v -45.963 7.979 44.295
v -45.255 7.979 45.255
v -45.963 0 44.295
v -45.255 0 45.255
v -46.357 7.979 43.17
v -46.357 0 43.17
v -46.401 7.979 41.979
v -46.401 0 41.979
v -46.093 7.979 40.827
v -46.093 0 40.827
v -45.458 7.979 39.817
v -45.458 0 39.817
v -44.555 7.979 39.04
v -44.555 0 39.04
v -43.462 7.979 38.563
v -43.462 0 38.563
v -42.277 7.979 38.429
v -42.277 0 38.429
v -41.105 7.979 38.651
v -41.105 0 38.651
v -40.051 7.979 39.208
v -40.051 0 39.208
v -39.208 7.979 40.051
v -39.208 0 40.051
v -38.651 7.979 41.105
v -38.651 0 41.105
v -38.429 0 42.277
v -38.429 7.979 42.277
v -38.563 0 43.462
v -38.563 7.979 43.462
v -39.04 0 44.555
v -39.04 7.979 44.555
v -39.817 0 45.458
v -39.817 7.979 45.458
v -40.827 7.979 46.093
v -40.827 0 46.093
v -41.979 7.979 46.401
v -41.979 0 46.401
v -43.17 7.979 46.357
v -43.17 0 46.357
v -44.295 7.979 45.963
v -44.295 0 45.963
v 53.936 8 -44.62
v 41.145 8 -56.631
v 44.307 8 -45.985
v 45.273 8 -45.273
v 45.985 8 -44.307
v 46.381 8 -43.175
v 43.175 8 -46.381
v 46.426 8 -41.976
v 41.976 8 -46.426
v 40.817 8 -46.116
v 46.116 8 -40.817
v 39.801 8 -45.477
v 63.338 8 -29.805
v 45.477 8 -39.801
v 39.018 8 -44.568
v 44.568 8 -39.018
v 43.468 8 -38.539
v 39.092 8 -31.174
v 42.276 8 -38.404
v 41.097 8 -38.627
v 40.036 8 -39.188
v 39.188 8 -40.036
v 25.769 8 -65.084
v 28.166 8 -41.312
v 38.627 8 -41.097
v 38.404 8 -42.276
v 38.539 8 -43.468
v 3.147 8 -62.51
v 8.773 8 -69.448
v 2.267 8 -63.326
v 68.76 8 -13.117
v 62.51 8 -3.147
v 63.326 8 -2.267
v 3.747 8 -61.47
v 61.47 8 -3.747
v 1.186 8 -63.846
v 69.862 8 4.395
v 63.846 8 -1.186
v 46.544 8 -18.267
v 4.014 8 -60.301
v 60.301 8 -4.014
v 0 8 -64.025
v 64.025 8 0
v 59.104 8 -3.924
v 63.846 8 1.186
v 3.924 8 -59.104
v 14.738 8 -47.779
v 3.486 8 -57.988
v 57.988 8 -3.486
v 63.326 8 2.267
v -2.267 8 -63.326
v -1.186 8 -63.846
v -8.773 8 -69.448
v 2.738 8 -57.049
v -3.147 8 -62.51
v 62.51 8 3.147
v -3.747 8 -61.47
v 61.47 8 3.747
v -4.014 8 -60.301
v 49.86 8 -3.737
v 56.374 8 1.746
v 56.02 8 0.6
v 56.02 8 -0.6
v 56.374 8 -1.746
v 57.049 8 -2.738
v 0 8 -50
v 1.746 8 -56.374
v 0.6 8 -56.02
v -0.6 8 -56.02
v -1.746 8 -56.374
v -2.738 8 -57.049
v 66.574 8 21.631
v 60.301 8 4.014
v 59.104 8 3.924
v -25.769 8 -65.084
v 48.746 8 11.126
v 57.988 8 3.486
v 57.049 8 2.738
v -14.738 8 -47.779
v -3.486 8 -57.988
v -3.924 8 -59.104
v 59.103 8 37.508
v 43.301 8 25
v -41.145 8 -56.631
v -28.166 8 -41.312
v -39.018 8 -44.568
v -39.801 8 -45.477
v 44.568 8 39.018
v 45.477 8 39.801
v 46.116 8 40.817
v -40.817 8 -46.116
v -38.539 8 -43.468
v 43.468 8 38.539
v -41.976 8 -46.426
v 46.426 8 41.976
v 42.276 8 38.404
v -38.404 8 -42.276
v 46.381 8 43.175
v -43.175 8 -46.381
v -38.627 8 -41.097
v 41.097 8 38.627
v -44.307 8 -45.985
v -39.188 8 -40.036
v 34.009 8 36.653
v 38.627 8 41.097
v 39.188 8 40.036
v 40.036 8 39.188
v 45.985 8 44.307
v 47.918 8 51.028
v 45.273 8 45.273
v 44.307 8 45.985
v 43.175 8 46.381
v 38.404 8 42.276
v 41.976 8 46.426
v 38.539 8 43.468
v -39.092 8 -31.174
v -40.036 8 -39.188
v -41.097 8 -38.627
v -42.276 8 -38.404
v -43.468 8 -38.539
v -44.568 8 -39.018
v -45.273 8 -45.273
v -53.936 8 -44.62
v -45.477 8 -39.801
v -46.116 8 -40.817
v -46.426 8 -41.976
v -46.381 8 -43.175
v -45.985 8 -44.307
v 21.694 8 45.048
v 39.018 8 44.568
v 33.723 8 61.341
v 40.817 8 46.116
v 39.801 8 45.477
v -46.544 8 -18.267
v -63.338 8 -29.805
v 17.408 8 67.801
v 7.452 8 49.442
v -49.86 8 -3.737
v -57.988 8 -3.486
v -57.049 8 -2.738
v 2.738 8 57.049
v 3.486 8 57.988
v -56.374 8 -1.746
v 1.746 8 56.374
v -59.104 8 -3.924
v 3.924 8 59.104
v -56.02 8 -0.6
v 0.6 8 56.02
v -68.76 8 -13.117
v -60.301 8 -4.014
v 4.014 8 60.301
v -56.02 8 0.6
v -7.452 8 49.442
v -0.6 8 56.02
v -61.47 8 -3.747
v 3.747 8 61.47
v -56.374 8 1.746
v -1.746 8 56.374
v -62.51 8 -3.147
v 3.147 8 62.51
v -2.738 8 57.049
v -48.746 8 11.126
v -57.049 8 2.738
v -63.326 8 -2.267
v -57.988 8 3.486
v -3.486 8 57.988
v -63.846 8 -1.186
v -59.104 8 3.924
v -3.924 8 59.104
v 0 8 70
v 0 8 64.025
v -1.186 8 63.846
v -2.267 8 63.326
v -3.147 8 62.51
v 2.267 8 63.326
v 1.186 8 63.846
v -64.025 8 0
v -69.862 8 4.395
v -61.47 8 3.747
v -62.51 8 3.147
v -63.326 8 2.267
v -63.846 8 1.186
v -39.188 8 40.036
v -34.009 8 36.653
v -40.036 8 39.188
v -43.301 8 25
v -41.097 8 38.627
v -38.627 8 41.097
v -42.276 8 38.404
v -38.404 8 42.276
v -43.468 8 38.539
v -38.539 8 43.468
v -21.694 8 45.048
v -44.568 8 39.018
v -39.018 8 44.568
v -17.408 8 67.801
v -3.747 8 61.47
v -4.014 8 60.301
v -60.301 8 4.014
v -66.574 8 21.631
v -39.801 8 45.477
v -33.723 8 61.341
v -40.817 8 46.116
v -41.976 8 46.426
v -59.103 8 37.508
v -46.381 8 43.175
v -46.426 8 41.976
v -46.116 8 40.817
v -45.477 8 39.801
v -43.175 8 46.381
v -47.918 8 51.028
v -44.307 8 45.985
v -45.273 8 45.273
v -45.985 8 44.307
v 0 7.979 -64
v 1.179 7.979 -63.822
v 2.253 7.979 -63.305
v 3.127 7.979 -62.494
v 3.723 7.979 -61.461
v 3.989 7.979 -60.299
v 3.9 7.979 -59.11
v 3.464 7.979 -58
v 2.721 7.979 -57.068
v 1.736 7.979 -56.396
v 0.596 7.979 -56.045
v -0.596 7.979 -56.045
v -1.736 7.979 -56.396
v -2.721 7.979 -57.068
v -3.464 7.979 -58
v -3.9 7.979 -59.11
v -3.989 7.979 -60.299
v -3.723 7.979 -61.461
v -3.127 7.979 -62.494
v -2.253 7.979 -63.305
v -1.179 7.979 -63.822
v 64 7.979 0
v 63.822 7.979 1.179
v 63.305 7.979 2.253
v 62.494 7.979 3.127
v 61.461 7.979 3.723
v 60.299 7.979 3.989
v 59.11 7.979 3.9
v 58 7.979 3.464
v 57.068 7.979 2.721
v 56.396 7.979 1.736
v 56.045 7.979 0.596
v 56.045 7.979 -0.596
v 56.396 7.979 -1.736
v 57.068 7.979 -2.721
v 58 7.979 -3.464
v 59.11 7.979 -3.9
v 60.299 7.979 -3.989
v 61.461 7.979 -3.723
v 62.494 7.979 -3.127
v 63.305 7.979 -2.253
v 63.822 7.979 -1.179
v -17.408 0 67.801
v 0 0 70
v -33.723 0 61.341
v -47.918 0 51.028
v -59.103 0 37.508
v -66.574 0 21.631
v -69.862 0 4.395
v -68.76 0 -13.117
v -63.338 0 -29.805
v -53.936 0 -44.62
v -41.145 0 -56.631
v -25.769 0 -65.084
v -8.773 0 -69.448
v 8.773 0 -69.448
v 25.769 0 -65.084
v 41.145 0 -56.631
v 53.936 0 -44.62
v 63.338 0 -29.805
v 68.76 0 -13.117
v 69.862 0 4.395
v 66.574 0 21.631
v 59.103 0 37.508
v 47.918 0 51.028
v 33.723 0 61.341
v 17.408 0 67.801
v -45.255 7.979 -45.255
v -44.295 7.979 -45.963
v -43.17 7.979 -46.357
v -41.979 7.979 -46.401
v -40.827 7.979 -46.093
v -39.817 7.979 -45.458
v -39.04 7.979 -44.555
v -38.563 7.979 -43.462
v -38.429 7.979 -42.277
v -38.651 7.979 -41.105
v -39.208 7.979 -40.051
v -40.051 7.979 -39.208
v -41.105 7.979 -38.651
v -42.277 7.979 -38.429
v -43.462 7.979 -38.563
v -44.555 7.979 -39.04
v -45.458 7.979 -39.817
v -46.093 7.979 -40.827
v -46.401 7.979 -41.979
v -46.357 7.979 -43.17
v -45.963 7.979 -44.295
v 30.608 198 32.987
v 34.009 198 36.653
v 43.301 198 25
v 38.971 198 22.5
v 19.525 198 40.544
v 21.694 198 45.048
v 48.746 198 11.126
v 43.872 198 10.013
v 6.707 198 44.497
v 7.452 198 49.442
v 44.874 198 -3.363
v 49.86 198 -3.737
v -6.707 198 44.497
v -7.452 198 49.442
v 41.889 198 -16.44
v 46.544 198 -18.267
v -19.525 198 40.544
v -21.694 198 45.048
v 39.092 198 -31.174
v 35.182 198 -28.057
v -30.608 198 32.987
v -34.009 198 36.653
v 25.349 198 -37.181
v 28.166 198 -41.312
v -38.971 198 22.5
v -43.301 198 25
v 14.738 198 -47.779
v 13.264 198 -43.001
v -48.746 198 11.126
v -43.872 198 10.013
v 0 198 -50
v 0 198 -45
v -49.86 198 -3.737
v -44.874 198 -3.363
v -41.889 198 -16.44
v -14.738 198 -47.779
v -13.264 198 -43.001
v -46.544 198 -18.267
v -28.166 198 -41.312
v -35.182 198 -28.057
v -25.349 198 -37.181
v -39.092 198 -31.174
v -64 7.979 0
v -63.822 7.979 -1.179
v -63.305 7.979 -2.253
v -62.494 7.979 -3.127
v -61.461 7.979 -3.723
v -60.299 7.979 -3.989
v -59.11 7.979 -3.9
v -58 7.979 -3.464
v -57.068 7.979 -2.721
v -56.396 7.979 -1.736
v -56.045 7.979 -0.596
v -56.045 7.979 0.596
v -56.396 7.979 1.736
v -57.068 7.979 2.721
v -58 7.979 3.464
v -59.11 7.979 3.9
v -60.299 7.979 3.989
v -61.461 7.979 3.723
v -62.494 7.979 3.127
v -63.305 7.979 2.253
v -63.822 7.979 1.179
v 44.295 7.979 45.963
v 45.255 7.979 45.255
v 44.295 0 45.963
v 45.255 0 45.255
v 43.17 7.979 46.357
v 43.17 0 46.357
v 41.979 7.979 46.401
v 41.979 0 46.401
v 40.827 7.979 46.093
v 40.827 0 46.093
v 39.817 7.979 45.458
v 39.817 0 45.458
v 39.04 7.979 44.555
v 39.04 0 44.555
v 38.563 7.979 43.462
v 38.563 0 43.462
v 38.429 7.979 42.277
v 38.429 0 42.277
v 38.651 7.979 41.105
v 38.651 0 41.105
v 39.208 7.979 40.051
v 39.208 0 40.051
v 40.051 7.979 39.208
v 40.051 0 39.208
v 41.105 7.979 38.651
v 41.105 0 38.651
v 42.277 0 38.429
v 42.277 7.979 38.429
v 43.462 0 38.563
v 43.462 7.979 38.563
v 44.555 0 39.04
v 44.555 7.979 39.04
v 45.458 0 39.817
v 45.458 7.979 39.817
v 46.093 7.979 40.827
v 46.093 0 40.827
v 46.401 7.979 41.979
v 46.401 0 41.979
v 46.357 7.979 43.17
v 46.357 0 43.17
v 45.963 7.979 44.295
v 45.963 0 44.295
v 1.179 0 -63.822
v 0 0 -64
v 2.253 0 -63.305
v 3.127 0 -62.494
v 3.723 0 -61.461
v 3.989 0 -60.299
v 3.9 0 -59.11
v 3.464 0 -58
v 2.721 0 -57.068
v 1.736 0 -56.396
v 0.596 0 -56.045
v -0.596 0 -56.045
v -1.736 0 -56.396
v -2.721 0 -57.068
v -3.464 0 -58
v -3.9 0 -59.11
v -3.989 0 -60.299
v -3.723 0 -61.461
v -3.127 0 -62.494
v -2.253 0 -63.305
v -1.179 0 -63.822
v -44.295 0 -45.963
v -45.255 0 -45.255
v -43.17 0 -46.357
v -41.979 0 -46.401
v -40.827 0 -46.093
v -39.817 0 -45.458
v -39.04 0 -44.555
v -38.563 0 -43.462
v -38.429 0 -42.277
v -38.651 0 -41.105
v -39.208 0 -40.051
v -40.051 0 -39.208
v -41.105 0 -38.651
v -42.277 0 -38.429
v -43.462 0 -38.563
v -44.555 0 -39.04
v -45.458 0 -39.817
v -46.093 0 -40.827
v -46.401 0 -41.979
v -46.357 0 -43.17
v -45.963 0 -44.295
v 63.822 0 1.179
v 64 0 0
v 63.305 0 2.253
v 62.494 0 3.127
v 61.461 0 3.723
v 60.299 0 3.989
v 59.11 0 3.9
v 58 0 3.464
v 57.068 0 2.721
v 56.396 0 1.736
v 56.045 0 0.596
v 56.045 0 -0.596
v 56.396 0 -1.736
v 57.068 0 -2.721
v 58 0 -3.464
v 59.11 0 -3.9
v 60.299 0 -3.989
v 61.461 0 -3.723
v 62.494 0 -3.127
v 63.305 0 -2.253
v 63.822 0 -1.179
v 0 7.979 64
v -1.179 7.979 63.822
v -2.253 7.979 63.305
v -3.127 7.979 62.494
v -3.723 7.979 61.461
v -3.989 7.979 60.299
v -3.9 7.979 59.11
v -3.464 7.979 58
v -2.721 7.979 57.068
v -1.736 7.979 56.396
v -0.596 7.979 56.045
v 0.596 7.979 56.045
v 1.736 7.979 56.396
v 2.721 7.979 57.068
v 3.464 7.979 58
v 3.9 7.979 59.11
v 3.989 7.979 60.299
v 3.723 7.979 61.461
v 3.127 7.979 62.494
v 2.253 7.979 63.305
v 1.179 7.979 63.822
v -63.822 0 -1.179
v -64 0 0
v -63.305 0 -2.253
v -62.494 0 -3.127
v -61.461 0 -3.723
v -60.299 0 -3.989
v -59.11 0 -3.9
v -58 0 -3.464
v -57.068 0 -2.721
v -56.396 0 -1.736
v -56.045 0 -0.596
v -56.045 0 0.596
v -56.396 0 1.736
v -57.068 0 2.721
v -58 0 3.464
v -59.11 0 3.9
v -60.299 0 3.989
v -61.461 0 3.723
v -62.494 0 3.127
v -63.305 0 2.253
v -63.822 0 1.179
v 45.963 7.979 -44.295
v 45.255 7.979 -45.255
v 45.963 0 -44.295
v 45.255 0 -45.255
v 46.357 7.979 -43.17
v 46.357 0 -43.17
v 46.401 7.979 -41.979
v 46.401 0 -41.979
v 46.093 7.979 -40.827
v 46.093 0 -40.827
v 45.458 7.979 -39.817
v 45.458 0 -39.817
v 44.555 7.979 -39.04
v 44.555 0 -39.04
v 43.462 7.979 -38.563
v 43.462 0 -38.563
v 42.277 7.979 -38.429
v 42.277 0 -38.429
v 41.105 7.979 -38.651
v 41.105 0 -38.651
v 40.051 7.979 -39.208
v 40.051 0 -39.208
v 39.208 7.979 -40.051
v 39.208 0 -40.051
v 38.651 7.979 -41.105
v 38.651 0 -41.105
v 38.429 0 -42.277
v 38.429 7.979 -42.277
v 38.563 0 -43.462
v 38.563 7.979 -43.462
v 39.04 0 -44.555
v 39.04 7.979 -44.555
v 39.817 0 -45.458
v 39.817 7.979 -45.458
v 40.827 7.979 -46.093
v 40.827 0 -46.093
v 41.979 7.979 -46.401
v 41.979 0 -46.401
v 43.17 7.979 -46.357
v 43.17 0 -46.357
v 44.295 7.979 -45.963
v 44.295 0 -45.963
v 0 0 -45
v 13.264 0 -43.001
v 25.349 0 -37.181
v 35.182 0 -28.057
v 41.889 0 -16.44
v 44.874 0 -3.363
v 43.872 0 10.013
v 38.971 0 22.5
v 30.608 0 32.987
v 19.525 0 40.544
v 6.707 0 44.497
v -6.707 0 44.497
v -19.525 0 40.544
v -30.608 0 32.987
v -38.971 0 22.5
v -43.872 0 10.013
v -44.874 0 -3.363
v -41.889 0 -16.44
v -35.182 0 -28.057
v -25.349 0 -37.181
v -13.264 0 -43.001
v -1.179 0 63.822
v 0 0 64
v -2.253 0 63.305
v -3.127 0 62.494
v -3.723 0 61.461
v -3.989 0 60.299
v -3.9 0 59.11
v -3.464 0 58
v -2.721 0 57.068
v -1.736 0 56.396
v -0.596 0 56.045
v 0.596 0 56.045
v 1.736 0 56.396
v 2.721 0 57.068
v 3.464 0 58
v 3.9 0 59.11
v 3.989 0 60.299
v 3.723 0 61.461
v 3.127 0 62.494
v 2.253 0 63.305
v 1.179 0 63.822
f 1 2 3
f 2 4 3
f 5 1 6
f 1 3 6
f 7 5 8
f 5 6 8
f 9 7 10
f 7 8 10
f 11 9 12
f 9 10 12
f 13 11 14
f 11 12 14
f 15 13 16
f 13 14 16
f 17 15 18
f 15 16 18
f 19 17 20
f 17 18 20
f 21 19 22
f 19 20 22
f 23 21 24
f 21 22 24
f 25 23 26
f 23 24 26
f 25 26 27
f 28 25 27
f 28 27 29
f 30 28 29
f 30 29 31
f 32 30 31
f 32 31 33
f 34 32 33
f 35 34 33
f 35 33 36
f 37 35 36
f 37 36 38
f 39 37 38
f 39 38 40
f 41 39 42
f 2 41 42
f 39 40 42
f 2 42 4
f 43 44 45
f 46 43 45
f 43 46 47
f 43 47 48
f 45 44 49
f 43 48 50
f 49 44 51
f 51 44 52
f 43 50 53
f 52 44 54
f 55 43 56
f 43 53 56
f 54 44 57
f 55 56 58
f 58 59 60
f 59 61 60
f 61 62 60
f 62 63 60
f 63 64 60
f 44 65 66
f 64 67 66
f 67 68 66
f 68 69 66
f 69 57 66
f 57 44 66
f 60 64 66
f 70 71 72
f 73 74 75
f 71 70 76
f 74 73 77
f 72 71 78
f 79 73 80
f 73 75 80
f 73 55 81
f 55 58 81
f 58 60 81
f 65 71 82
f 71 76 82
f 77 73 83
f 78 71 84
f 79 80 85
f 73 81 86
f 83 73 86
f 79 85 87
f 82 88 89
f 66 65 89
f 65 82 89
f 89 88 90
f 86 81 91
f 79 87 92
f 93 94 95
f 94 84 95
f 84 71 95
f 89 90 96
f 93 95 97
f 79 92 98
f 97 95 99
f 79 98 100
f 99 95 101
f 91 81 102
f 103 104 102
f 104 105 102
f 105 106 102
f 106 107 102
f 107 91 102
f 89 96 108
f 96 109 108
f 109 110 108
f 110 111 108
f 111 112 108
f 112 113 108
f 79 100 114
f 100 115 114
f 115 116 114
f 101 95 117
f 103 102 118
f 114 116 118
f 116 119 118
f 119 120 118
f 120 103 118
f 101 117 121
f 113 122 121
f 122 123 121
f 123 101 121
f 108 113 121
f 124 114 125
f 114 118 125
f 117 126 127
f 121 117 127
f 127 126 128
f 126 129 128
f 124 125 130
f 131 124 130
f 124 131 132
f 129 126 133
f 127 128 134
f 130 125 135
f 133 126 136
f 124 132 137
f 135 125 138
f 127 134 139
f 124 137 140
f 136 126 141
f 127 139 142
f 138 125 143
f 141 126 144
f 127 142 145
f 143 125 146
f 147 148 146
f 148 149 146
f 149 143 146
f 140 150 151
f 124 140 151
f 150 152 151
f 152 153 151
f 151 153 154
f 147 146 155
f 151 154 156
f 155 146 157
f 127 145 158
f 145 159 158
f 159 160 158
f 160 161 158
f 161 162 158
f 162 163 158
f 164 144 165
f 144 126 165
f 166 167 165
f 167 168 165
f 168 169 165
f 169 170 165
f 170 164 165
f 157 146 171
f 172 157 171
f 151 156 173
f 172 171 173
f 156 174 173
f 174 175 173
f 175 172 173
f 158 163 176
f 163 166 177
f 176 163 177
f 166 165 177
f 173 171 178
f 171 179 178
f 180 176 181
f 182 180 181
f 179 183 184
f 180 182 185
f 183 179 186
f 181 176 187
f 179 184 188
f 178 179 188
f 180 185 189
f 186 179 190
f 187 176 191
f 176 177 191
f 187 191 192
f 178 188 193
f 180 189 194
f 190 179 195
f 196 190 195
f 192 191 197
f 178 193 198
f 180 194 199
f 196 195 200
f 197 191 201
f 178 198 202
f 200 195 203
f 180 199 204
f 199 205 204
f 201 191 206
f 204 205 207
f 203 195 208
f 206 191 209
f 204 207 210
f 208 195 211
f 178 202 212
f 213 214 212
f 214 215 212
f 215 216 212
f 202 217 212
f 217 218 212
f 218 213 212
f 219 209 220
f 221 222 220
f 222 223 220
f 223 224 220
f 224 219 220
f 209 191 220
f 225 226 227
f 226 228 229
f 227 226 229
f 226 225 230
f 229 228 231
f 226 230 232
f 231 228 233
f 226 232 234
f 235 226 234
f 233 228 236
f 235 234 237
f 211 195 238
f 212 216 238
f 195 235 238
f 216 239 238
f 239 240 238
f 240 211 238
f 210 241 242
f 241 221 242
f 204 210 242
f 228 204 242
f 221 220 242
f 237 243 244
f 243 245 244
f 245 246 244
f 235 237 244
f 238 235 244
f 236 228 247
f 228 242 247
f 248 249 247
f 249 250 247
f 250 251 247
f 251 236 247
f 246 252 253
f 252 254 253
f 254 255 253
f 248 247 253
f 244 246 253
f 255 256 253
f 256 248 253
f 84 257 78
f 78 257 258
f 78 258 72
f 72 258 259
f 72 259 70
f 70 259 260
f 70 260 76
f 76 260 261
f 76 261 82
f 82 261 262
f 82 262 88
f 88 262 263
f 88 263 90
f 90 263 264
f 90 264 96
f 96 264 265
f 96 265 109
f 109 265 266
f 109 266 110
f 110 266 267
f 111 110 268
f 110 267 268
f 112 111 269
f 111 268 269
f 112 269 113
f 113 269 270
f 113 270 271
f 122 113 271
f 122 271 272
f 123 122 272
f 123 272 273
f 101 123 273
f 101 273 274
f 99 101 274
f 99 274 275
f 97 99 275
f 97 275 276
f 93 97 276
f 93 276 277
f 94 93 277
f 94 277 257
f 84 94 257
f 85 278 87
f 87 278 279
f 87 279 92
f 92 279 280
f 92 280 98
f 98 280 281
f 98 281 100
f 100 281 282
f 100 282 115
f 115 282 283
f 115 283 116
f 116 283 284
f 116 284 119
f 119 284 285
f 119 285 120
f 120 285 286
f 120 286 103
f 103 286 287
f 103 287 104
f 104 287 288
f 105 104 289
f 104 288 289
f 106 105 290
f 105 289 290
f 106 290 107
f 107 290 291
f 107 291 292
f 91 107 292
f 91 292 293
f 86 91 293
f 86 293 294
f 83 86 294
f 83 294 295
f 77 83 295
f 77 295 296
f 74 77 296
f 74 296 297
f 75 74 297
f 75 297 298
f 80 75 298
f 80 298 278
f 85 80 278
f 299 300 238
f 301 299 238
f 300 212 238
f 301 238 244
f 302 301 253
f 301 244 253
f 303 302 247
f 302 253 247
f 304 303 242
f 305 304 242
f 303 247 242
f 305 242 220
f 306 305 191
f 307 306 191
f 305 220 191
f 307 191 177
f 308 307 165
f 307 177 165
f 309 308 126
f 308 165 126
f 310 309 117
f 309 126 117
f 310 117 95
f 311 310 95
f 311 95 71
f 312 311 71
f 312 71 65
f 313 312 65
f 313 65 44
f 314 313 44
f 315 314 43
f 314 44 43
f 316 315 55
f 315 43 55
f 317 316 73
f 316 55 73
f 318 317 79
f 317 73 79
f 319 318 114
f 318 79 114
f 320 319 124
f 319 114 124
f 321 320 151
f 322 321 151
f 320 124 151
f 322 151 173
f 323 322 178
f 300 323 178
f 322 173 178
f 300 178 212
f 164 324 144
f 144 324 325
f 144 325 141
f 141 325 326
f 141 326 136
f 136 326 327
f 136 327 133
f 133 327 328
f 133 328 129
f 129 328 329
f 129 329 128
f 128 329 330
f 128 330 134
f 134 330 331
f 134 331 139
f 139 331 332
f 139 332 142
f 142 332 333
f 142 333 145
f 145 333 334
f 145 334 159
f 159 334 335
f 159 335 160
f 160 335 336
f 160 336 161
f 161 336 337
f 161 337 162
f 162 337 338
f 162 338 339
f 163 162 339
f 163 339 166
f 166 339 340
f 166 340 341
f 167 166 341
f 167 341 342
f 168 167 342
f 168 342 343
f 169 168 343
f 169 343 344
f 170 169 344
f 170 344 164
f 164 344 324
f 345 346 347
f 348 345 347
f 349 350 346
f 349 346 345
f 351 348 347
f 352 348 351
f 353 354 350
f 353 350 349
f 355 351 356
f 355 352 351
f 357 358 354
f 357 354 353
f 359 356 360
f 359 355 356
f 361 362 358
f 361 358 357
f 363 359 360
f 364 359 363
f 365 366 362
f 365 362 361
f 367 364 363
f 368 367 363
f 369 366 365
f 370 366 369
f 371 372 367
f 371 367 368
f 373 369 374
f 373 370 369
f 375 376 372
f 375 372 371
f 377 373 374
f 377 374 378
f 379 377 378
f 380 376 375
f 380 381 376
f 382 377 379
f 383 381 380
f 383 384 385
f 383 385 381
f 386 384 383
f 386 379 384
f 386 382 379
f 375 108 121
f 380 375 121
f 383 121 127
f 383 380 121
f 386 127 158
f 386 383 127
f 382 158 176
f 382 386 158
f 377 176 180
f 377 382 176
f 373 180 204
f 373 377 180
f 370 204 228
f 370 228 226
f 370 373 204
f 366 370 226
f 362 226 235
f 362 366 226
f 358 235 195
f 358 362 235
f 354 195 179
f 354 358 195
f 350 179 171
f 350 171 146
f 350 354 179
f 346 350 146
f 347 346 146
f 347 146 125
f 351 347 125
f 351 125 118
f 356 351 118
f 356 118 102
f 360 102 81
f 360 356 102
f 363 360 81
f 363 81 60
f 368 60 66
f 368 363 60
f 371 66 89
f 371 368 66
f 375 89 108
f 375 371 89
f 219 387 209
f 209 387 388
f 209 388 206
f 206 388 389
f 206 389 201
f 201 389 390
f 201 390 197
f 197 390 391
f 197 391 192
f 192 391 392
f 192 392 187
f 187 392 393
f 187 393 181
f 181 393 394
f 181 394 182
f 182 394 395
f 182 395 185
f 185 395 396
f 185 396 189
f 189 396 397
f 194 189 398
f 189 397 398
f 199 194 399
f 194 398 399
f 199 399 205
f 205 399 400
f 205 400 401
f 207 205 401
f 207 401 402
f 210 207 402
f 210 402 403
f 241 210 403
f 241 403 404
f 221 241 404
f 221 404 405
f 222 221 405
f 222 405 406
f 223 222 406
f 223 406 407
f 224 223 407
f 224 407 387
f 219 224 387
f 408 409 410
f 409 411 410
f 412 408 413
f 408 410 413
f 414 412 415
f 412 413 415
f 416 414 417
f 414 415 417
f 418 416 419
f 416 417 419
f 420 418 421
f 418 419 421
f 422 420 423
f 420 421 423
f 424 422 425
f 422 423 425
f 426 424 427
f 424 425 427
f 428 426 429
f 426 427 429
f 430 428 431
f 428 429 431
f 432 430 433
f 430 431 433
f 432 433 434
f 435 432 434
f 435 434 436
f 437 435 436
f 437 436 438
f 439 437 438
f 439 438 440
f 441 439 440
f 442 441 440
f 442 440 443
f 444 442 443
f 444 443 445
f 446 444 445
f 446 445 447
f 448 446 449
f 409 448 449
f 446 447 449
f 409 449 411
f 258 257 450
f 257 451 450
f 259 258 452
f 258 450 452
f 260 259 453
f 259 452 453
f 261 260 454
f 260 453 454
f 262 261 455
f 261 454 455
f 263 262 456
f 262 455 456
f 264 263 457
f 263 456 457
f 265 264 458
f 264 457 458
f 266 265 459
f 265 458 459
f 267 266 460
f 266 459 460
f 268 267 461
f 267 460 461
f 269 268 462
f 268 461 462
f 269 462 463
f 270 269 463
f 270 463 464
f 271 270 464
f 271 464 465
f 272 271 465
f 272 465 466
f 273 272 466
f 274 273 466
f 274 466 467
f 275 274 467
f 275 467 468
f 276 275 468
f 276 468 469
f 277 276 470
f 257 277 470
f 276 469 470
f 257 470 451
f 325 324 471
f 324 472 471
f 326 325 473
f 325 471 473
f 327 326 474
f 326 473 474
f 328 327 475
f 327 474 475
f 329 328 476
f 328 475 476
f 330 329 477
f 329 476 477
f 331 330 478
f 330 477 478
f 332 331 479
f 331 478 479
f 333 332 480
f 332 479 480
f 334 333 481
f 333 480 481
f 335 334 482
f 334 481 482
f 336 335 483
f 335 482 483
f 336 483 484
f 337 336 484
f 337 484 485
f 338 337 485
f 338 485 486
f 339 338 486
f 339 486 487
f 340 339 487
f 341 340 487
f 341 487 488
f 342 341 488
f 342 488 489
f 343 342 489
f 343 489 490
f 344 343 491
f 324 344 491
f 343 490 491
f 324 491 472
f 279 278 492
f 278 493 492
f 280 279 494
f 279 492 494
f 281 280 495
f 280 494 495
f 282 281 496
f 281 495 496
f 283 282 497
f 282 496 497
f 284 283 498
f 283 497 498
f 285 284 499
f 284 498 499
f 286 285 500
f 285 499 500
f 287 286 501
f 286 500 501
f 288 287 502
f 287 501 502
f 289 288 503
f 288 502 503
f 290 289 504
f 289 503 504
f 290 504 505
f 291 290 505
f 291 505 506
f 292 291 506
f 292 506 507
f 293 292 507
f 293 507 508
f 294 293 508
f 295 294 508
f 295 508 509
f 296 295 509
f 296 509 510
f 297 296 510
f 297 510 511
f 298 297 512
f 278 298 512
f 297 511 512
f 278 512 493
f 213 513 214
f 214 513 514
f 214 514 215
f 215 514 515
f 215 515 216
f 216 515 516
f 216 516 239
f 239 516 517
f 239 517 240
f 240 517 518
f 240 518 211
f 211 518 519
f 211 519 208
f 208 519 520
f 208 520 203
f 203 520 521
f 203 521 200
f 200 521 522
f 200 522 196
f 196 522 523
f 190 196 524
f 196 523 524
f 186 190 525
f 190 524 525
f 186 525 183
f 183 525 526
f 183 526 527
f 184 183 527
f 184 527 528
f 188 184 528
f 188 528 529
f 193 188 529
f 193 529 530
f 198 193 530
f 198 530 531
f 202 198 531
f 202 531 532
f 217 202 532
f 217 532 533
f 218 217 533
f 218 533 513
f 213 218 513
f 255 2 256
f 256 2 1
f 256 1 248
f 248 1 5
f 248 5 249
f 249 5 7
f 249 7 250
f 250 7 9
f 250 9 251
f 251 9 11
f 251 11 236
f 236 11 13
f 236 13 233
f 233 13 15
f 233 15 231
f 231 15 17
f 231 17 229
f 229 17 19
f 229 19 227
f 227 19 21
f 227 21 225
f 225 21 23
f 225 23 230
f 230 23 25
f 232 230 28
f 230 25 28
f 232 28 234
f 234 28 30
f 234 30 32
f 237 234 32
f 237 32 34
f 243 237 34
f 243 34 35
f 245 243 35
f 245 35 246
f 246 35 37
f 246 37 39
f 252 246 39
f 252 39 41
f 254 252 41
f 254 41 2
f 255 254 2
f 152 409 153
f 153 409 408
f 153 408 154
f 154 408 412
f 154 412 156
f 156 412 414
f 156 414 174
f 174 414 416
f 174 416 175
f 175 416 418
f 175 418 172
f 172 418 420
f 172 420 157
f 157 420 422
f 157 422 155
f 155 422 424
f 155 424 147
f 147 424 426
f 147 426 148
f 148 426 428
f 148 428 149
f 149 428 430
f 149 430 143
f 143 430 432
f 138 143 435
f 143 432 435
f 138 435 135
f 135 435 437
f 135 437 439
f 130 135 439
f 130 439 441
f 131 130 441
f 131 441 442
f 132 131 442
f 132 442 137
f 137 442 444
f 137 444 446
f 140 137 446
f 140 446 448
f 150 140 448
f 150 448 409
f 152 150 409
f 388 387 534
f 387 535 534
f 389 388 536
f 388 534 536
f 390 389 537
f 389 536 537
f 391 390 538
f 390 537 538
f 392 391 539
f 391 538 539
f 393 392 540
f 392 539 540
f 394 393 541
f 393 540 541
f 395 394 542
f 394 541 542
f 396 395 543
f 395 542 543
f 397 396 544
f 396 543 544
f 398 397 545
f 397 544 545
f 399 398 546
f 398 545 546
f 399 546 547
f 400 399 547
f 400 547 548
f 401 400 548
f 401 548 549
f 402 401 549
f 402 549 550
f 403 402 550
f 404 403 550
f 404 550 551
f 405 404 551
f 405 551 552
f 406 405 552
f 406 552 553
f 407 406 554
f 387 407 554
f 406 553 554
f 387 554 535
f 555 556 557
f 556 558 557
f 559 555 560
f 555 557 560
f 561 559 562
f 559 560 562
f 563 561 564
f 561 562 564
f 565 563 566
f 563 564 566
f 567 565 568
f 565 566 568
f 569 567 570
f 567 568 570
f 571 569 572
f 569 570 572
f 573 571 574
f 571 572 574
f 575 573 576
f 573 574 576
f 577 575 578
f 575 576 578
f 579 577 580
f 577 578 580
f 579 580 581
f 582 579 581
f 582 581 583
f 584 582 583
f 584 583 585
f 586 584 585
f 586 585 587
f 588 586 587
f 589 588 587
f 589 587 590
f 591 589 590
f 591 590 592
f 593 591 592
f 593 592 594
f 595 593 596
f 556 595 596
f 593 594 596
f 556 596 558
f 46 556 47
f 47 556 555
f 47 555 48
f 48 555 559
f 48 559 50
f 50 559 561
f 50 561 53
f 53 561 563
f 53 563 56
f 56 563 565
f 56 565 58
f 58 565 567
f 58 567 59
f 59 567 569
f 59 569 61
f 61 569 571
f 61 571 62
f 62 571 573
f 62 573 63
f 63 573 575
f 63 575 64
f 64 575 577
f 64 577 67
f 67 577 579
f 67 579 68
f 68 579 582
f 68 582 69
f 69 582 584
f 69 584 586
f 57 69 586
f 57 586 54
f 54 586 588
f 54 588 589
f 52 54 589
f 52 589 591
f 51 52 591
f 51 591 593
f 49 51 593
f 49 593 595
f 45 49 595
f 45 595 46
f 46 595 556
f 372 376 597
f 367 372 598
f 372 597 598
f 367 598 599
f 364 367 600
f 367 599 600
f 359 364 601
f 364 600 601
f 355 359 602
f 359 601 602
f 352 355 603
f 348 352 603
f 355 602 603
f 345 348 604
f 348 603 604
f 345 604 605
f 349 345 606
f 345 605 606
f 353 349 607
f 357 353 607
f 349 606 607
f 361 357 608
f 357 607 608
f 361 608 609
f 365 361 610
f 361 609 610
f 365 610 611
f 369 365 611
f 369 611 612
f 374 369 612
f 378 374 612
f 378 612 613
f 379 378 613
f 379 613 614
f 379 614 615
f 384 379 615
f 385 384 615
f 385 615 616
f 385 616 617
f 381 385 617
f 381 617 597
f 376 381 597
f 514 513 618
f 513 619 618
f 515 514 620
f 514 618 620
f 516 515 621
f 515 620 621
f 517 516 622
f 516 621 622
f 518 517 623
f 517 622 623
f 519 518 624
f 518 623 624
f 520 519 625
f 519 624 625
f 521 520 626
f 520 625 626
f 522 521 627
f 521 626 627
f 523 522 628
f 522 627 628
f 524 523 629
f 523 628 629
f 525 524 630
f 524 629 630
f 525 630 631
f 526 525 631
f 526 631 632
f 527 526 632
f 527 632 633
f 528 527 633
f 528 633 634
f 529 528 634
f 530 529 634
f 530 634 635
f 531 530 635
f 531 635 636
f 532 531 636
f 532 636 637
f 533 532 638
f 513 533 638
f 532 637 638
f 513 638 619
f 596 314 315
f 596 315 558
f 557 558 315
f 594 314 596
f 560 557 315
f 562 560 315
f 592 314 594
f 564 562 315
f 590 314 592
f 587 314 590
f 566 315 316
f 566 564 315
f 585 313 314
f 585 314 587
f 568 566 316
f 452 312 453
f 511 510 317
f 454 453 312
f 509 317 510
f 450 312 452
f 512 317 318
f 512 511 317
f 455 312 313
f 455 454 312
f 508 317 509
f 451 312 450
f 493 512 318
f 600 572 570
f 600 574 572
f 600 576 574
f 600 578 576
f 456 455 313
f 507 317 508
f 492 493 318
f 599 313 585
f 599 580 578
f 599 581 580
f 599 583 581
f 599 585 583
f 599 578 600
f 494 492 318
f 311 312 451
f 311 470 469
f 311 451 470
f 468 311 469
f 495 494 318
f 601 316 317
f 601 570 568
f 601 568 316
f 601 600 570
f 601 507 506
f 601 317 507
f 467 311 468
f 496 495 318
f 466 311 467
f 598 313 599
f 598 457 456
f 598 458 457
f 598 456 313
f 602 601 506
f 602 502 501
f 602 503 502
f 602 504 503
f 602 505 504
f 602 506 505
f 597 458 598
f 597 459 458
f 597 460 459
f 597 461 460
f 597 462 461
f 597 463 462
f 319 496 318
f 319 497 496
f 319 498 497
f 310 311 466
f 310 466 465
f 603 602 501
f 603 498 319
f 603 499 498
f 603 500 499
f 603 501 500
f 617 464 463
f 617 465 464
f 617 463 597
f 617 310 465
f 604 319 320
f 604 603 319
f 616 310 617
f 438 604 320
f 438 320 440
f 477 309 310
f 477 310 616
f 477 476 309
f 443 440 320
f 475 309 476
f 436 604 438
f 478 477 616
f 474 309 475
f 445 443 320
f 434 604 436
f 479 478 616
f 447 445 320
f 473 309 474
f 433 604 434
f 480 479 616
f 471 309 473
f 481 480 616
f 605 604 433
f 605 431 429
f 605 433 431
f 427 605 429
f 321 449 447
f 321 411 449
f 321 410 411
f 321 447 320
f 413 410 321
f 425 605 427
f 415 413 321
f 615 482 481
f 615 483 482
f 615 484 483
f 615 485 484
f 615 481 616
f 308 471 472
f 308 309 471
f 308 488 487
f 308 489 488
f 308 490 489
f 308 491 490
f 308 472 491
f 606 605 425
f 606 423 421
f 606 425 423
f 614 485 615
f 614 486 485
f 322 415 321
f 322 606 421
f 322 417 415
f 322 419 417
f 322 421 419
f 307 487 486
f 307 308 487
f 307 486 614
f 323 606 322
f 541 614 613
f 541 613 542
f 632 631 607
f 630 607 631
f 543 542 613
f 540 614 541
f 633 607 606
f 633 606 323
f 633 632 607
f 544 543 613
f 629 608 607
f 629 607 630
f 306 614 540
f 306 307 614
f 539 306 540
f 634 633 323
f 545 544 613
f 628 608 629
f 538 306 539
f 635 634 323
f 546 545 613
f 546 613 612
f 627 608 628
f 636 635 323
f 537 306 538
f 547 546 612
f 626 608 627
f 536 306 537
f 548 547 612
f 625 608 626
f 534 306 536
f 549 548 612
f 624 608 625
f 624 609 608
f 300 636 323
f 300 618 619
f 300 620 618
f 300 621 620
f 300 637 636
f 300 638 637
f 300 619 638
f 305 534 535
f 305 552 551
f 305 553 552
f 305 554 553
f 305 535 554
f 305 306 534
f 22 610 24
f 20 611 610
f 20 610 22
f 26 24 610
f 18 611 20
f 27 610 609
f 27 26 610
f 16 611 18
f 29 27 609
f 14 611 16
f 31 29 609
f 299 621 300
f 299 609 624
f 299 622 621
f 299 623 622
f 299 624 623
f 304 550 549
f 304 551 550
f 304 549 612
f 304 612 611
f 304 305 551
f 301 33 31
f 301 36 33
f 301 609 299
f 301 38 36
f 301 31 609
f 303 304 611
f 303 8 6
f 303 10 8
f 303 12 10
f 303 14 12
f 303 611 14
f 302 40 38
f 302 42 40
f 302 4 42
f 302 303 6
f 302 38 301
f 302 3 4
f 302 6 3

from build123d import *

# Parameters (mm, degrees)
SKETCH_1_W               = 70
SKETCH_1_H               = 8
M8X1_0_2_D               = 8
M8X1_0_2_CSINK_D         = 8.05
M8X1_0_2_CSINK_ANGLE     = 100
PATTERN_CIRCULAR_2_COUNT = 8
SKETCH_11_W              = 50
SKETCH_11_H              = 190
SKETCH_12_R              = 45
CUT_EXTRUDE_1_DEPTH      = 222.368471106


with BuildPart() as part:
    # 草图1 → 旋转1 (revolve)
    with BuildSketch(Plane.XY):
        with Locations((-35, 4)):
            Rectangle(SKETCH_1_W, SKETCH_1_H)
    revolve(axis=Axis((0, 76.619497233, 0), (0, -1, 0)))

    # M8x1.0 螺纹孔2 (through all)
    with Locations(Plane(origin=(0, 8, 0), x_dir=(1, 0, 0), z_dir=(0, 1, 0))):
        with Locations((-60, 0)):
            m8x1_0_2 = CounterSinkHole(M8X1_0_2_D / 2, M8X1_0_2_CSINK_D / 2, counter_sink_angle=M8X1_0_2_CSINK_ANGLE)

    # 阵列(圆周)2: M8x1.0 螺纹孔2 ×8 about axis
    pattern_circular_2_axis = Axis((0, 76.619497233, 0), (0, -1, 0))
    for i in range(1, PATTERN_CIRCULAR_2_COUNT):
        add(m8x1_0_2.rotate(pattern_circular_2_axis, i * 360 / PATTERN_CIRCULAR_2_COUNT), mode=Mode.SUBTRACT)

    # 草图11 → 旋转2 (revolve)
    with BuildSketch(Plane.XY):
        with Locations((-25, 103)):
            Rectangle(SKETCH_11_W, SKETCH_11_H)
    revolve(axis=Axis((0, 8, 0), (0, 1, 0)))

    # 草图12 → 切除-拉伸1 (cut, through all)
    with BuildSketch(Plane.XZ):
        Circle(SKETCH_12_R)
    extrude(amount=-CUT_EXTRUDE_1_DEPTH, mode=Mode.SUBTRACT)


solid = part.part
